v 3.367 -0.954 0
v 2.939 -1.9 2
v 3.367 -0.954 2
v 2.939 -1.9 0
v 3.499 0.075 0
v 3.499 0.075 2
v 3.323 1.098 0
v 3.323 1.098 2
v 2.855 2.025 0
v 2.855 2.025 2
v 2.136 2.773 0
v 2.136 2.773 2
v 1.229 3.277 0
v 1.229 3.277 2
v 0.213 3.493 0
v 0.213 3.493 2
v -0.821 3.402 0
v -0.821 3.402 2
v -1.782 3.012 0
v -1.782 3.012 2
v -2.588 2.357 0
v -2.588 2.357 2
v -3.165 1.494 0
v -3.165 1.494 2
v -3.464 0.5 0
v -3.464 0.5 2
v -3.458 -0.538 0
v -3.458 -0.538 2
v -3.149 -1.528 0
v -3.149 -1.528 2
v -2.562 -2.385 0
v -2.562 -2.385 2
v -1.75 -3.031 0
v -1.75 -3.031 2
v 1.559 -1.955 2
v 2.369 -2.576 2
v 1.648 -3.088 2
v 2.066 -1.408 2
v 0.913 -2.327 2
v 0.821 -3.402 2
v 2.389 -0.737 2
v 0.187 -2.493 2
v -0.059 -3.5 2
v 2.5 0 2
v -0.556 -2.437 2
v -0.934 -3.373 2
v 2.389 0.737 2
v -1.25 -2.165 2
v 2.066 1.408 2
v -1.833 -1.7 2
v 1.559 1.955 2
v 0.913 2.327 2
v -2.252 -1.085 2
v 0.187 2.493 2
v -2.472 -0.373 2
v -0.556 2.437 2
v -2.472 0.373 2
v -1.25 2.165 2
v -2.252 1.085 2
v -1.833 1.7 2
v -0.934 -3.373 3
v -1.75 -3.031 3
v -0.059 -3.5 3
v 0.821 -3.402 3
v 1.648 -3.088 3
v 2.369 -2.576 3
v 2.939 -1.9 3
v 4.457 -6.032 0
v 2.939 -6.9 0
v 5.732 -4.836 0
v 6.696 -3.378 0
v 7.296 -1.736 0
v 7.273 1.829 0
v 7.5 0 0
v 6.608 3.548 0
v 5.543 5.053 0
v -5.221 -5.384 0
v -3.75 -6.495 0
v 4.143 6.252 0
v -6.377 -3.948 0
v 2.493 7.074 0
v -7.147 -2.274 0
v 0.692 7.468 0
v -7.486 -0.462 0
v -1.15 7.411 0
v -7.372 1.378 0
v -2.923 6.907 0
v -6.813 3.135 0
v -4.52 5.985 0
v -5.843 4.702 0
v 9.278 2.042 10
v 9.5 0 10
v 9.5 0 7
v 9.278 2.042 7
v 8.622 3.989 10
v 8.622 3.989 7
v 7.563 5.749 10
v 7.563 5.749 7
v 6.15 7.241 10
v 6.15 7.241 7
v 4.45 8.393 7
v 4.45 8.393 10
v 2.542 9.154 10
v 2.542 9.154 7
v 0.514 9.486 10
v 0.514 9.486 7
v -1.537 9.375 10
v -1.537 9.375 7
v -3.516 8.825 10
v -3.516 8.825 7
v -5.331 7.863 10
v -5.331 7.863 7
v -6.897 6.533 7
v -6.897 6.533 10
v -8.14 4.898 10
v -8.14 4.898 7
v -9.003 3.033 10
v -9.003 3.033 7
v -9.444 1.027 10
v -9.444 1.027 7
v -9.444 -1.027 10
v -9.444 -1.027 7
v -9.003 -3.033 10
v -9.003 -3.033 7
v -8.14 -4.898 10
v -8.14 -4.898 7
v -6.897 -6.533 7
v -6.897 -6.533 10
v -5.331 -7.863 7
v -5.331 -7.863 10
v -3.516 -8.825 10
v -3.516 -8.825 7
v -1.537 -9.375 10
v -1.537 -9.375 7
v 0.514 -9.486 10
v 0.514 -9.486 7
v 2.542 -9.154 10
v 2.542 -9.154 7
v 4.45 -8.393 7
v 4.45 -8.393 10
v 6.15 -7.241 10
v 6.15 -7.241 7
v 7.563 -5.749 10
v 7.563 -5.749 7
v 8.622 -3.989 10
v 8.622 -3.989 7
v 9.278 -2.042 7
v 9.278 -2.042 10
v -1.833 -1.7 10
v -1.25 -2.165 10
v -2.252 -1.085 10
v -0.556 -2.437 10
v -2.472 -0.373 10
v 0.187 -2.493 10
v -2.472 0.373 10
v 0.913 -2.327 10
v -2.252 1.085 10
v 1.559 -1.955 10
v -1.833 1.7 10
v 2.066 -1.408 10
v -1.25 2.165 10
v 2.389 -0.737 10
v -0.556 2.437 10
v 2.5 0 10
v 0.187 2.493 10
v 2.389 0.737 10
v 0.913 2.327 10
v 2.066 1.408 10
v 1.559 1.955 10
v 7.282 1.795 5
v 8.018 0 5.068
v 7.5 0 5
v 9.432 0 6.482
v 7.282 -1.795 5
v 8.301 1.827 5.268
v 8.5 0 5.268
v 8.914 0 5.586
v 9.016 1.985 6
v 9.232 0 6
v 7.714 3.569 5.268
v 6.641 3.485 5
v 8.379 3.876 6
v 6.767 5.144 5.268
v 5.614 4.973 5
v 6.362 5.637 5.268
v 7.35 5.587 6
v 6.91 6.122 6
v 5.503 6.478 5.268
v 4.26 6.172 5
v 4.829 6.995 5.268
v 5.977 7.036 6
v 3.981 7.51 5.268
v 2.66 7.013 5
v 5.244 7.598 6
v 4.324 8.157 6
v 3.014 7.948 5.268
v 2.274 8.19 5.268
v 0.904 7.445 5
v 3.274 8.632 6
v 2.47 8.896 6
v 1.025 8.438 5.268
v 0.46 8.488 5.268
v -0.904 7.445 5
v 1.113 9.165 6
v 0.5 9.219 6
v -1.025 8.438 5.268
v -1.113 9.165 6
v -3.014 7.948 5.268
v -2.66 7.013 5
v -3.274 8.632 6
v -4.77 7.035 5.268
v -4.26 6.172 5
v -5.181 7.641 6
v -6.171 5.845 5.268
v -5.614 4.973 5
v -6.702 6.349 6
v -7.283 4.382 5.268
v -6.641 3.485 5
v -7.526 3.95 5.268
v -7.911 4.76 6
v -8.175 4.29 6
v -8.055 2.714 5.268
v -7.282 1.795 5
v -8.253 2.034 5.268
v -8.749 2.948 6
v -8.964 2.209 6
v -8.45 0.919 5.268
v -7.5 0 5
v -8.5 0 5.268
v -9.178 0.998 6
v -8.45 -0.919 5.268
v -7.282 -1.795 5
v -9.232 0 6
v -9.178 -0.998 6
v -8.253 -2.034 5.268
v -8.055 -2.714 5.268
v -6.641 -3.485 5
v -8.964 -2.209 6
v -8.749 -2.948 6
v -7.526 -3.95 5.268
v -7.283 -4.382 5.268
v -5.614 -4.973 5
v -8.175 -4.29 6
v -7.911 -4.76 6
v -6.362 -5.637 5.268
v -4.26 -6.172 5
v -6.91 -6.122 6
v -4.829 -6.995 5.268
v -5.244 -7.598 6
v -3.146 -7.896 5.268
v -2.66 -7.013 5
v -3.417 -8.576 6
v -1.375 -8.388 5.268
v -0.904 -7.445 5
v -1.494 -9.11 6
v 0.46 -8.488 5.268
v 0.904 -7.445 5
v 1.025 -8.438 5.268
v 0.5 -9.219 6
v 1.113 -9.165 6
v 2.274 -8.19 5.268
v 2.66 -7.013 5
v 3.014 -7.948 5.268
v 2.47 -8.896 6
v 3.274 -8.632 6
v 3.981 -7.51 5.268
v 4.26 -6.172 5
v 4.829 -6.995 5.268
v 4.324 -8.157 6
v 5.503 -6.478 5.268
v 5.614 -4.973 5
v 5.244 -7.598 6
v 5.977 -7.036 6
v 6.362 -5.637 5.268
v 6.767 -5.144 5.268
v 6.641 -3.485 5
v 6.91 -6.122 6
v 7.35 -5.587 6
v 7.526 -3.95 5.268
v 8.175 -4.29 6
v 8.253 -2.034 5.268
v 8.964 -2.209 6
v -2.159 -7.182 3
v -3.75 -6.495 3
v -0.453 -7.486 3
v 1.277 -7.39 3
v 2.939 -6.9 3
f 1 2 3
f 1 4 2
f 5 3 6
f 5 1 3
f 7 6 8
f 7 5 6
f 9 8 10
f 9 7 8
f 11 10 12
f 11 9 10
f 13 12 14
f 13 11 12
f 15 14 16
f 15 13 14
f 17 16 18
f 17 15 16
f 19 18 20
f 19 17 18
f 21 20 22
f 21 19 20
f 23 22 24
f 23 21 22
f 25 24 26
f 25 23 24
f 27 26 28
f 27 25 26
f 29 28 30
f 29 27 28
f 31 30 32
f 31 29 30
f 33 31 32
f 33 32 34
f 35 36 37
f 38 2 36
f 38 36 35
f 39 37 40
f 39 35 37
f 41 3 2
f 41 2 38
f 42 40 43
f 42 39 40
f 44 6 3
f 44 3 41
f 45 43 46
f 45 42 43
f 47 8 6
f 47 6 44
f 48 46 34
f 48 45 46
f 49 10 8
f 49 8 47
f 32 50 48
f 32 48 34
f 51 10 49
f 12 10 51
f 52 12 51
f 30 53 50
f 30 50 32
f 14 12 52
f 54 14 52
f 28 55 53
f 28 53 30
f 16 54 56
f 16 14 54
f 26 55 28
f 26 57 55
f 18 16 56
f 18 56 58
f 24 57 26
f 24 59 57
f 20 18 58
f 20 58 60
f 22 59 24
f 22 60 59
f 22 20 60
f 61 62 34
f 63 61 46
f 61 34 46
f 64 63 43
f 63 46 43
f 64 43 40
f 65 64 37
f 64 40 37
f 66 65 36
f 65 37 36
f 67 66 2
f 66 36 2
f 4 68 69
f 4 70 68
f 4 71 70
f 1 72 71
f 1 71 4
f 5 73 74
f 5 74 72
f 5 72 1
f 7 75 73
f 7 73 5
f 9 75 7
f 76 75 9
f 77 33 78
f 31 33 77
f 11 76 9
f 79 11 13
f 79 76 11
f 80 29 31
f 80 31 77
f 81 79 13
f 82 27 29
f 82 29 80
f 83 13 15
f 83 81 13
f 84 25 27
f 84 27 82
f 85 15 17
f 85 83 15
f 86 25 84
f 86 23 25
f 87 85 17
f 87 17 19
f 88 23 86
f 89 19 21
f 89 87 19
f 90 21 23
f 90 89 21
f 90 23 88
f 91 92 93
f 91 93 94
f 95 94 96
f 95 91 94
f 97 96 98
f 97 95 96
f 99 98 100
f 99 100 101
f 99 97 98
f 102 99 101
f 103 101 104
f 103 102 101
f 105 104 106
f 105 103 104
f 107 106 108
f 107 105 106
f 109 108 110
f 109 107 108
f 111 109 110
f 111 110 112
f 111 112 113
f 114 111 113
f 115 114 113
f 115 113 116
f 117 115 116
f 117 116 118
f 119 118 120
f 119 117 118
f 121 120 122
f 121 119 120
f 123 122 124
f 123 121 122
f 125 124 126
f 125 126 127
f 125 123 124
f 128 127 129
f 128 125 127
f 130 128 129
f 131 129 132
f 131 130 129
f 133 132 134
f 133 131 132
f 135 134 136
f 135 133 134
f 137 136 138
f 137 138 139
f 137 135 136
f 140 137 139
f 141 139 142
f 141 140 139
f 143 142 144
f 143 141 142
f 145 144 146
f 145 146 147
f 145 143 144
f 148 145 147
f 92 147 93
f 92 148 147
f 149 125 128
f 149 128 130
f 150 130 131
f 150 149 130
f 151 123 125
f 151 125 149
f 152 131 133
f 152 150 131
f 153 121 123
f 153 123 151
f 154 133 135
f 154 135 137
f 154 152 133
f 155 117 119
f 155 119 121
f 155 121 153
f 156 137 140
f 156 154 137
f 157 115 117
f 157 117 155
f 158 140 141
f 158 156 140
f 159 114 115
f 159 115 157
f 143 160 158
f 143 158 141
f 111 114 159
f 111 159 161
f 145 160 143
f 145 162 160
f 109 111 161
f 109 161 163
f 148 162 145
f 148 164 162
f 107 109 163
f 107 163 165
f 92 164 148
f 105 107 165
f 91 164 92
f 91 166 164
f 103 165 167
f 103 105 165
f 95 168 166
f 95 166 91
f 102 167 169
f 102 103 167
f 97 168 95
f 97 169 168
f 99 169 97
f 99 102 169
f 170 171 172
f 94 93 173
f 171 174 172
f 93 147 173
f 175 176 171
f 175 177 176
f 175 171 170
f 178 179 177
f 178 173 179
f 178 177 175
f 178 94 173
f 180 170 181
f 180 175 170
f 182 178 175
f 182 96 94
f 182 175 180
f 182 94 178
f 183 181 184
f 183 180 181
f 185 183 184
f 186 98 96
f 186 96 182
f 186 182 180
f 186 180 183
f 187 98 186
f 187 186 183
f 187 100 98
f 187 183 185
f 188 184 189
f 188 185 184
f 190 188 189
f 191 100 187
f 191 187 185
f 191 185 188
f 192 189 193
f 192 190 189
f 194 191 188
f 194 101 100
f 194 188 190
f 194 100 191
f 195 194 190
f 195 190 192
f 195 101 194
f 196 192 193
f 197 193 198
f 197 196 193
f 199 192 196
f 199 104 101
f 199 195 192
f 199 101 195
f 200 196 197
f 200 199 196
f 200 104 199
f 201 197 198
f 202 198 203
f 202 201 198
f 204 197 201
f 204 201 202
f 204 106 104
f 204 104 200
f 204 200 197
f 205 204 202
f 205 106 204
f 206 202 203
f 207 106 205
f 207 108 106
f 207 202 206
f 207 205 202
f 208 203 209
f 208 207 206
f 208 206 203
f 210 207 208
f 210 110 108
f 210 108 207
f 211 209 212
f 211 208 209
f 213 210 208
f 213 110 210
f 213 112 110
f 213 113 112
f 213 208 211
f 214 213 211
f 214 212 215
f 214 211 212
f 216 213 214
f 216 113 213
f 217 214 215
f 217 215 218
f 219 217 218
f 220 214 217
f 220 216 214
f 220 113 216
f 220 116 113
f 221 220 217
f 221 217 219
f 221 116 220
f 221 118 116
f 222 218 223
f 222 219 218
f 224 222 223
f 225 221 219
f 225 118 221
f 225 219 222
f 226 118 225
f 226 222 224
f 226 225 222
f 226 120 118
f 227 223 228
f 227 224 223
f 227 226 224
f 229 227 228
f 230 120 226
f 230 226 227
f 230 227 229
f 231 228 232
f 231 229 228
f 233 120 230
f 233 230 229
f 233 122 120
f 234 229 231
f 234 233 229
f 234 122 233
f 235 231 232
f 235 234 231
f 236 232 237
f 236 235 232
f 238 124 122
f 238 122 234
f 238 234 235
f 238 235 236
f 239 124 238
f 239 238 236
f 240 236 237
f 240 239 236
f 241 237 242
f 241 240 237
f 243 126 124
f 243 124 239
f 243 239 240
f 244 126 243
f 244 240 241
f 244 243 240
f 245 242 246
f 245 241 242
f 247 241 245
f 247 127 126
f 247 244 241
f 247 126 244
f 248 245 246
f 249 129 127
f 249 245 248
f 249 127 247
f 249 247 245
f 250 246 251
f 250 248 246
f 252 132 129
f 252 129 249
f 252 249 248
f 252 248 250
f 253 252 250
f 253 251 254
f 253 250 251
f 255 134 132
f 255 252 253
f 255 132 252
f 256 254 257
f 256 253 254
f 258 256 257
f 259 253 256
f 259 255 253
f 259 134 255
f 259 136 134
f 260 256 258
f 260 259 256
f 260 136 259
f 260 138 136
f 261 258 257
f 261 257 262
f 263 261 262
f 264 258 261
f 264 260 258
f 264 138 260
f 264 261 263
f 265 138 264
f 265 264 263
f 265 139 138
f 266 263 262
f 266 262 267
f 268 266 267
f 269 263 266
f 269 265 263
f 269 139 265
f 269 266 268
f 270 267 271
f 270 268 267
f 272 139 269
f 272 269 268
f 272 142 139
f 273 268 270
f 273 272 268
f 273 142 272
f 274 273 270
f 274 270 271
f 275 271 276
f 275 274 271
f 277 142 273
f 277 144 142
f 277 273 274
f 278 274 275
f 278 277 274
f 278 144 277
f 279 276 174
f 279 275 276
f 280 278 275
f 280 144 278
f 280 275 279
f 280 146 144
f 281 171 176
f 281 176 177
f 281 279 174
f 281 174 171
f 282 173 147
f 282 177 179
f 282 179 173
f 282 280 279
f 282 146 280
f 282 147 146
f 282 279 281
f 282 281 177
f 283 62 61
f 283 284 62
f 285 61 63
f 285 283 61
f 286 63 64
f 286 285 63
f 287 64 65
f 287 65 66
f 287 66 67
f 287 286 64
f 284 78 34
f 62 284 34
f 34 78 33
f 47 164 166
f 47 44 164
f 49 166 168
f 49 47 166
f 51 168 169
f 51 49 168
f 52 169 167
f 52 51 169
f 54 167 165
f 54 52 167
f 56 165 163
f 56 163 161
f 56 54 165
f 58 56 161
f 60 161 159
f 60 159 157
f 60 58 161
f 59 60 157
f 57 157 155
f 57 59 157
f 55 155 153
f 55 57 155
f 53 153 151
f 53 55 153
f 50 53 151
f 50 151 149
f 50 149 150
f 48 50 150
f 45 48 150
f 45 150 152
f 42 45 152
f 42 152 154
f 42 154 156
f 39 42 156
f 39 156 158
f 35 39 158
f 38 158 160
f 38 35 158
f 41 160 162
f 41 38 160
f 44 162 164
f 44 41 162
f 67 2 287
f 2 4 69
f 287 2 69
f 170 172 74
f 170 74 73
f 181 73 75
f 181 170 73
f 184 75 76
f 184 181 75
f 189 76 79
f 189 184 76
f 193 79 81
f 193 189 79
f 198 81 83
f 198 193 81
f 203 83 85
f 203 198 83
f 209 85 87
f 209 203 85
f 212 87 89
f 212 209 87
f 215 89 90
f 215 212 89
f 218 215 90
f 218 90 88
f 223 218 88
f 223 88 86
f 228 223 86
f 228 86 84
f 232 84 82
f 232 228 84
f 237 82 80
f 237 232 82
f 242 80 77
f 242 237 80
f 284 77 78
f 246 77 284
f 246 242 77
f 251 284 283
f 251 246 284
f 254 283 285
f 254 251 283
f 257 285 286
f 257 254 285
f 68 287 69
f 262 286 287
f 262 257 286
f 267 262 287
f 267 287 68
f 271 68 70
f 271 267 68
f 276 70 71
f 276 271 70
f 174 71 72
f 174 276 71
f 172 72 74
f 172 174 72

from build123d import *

# Parameters (mm, degrees)
F2_R     = 1.99999
F4_DEPTH = 3


# Not quite as in the source:
# - a fillet or chamfer is up to 0.001 mm smaller than in the source, because OpenCascade refuses the exact size
# - a feature names something its author has since deleted; it is built from what else it names


with BuildPart() as f1:
    # F0 (on Front) → F1 (revolve)
    with BuildSketch(Plane.XZ):
        Polygon((2.5, 2), (3.5, 2), (3.5, 0), (7.5, 0), (7.5, 5), (9.5, 5), (9.5, 10), (2.5, 10), align=None)
    revolve(axis=Axis((0, 0, 8.8058942929), (0, 0, 1)))

    # F2 (radius 2 in the source; OpenCascade refuses exactly that, so slightly less here)
    f2_edges = [f1.edges().sort_by_distance(p)[0] for p in [
        (-9.5, 0, 5),
    ]]
    fillet(f2_edges, radius=F2_R)

    # F3 (on face) → F4 (cut)
    with BuildSketch(Plane(origin=(0, 0, 0), x_dir=(1, 0, 0), z_dir=(0, 0, -1))):
        with BuildLine():
            ThreePointArc((-1.75, 3.0310889132), (0.8206712512, 3.402425414), (2.9393876913, 1.9))
            Line((2.9393876913, 1.9), (2.9393876913, 6.9))
            ThreePointArc((2.9393876913, 6.9), (-0.4530350492, 7.486304779), (-3.75, 6.4951905284))
            Line((-3.75, 6.4951905284), (-1.75, 3.0310889132))
        make_face()
    extrude(amount=-F4_DEPTH, mode=Mode.SUBTRACT)


solid = f1.part
